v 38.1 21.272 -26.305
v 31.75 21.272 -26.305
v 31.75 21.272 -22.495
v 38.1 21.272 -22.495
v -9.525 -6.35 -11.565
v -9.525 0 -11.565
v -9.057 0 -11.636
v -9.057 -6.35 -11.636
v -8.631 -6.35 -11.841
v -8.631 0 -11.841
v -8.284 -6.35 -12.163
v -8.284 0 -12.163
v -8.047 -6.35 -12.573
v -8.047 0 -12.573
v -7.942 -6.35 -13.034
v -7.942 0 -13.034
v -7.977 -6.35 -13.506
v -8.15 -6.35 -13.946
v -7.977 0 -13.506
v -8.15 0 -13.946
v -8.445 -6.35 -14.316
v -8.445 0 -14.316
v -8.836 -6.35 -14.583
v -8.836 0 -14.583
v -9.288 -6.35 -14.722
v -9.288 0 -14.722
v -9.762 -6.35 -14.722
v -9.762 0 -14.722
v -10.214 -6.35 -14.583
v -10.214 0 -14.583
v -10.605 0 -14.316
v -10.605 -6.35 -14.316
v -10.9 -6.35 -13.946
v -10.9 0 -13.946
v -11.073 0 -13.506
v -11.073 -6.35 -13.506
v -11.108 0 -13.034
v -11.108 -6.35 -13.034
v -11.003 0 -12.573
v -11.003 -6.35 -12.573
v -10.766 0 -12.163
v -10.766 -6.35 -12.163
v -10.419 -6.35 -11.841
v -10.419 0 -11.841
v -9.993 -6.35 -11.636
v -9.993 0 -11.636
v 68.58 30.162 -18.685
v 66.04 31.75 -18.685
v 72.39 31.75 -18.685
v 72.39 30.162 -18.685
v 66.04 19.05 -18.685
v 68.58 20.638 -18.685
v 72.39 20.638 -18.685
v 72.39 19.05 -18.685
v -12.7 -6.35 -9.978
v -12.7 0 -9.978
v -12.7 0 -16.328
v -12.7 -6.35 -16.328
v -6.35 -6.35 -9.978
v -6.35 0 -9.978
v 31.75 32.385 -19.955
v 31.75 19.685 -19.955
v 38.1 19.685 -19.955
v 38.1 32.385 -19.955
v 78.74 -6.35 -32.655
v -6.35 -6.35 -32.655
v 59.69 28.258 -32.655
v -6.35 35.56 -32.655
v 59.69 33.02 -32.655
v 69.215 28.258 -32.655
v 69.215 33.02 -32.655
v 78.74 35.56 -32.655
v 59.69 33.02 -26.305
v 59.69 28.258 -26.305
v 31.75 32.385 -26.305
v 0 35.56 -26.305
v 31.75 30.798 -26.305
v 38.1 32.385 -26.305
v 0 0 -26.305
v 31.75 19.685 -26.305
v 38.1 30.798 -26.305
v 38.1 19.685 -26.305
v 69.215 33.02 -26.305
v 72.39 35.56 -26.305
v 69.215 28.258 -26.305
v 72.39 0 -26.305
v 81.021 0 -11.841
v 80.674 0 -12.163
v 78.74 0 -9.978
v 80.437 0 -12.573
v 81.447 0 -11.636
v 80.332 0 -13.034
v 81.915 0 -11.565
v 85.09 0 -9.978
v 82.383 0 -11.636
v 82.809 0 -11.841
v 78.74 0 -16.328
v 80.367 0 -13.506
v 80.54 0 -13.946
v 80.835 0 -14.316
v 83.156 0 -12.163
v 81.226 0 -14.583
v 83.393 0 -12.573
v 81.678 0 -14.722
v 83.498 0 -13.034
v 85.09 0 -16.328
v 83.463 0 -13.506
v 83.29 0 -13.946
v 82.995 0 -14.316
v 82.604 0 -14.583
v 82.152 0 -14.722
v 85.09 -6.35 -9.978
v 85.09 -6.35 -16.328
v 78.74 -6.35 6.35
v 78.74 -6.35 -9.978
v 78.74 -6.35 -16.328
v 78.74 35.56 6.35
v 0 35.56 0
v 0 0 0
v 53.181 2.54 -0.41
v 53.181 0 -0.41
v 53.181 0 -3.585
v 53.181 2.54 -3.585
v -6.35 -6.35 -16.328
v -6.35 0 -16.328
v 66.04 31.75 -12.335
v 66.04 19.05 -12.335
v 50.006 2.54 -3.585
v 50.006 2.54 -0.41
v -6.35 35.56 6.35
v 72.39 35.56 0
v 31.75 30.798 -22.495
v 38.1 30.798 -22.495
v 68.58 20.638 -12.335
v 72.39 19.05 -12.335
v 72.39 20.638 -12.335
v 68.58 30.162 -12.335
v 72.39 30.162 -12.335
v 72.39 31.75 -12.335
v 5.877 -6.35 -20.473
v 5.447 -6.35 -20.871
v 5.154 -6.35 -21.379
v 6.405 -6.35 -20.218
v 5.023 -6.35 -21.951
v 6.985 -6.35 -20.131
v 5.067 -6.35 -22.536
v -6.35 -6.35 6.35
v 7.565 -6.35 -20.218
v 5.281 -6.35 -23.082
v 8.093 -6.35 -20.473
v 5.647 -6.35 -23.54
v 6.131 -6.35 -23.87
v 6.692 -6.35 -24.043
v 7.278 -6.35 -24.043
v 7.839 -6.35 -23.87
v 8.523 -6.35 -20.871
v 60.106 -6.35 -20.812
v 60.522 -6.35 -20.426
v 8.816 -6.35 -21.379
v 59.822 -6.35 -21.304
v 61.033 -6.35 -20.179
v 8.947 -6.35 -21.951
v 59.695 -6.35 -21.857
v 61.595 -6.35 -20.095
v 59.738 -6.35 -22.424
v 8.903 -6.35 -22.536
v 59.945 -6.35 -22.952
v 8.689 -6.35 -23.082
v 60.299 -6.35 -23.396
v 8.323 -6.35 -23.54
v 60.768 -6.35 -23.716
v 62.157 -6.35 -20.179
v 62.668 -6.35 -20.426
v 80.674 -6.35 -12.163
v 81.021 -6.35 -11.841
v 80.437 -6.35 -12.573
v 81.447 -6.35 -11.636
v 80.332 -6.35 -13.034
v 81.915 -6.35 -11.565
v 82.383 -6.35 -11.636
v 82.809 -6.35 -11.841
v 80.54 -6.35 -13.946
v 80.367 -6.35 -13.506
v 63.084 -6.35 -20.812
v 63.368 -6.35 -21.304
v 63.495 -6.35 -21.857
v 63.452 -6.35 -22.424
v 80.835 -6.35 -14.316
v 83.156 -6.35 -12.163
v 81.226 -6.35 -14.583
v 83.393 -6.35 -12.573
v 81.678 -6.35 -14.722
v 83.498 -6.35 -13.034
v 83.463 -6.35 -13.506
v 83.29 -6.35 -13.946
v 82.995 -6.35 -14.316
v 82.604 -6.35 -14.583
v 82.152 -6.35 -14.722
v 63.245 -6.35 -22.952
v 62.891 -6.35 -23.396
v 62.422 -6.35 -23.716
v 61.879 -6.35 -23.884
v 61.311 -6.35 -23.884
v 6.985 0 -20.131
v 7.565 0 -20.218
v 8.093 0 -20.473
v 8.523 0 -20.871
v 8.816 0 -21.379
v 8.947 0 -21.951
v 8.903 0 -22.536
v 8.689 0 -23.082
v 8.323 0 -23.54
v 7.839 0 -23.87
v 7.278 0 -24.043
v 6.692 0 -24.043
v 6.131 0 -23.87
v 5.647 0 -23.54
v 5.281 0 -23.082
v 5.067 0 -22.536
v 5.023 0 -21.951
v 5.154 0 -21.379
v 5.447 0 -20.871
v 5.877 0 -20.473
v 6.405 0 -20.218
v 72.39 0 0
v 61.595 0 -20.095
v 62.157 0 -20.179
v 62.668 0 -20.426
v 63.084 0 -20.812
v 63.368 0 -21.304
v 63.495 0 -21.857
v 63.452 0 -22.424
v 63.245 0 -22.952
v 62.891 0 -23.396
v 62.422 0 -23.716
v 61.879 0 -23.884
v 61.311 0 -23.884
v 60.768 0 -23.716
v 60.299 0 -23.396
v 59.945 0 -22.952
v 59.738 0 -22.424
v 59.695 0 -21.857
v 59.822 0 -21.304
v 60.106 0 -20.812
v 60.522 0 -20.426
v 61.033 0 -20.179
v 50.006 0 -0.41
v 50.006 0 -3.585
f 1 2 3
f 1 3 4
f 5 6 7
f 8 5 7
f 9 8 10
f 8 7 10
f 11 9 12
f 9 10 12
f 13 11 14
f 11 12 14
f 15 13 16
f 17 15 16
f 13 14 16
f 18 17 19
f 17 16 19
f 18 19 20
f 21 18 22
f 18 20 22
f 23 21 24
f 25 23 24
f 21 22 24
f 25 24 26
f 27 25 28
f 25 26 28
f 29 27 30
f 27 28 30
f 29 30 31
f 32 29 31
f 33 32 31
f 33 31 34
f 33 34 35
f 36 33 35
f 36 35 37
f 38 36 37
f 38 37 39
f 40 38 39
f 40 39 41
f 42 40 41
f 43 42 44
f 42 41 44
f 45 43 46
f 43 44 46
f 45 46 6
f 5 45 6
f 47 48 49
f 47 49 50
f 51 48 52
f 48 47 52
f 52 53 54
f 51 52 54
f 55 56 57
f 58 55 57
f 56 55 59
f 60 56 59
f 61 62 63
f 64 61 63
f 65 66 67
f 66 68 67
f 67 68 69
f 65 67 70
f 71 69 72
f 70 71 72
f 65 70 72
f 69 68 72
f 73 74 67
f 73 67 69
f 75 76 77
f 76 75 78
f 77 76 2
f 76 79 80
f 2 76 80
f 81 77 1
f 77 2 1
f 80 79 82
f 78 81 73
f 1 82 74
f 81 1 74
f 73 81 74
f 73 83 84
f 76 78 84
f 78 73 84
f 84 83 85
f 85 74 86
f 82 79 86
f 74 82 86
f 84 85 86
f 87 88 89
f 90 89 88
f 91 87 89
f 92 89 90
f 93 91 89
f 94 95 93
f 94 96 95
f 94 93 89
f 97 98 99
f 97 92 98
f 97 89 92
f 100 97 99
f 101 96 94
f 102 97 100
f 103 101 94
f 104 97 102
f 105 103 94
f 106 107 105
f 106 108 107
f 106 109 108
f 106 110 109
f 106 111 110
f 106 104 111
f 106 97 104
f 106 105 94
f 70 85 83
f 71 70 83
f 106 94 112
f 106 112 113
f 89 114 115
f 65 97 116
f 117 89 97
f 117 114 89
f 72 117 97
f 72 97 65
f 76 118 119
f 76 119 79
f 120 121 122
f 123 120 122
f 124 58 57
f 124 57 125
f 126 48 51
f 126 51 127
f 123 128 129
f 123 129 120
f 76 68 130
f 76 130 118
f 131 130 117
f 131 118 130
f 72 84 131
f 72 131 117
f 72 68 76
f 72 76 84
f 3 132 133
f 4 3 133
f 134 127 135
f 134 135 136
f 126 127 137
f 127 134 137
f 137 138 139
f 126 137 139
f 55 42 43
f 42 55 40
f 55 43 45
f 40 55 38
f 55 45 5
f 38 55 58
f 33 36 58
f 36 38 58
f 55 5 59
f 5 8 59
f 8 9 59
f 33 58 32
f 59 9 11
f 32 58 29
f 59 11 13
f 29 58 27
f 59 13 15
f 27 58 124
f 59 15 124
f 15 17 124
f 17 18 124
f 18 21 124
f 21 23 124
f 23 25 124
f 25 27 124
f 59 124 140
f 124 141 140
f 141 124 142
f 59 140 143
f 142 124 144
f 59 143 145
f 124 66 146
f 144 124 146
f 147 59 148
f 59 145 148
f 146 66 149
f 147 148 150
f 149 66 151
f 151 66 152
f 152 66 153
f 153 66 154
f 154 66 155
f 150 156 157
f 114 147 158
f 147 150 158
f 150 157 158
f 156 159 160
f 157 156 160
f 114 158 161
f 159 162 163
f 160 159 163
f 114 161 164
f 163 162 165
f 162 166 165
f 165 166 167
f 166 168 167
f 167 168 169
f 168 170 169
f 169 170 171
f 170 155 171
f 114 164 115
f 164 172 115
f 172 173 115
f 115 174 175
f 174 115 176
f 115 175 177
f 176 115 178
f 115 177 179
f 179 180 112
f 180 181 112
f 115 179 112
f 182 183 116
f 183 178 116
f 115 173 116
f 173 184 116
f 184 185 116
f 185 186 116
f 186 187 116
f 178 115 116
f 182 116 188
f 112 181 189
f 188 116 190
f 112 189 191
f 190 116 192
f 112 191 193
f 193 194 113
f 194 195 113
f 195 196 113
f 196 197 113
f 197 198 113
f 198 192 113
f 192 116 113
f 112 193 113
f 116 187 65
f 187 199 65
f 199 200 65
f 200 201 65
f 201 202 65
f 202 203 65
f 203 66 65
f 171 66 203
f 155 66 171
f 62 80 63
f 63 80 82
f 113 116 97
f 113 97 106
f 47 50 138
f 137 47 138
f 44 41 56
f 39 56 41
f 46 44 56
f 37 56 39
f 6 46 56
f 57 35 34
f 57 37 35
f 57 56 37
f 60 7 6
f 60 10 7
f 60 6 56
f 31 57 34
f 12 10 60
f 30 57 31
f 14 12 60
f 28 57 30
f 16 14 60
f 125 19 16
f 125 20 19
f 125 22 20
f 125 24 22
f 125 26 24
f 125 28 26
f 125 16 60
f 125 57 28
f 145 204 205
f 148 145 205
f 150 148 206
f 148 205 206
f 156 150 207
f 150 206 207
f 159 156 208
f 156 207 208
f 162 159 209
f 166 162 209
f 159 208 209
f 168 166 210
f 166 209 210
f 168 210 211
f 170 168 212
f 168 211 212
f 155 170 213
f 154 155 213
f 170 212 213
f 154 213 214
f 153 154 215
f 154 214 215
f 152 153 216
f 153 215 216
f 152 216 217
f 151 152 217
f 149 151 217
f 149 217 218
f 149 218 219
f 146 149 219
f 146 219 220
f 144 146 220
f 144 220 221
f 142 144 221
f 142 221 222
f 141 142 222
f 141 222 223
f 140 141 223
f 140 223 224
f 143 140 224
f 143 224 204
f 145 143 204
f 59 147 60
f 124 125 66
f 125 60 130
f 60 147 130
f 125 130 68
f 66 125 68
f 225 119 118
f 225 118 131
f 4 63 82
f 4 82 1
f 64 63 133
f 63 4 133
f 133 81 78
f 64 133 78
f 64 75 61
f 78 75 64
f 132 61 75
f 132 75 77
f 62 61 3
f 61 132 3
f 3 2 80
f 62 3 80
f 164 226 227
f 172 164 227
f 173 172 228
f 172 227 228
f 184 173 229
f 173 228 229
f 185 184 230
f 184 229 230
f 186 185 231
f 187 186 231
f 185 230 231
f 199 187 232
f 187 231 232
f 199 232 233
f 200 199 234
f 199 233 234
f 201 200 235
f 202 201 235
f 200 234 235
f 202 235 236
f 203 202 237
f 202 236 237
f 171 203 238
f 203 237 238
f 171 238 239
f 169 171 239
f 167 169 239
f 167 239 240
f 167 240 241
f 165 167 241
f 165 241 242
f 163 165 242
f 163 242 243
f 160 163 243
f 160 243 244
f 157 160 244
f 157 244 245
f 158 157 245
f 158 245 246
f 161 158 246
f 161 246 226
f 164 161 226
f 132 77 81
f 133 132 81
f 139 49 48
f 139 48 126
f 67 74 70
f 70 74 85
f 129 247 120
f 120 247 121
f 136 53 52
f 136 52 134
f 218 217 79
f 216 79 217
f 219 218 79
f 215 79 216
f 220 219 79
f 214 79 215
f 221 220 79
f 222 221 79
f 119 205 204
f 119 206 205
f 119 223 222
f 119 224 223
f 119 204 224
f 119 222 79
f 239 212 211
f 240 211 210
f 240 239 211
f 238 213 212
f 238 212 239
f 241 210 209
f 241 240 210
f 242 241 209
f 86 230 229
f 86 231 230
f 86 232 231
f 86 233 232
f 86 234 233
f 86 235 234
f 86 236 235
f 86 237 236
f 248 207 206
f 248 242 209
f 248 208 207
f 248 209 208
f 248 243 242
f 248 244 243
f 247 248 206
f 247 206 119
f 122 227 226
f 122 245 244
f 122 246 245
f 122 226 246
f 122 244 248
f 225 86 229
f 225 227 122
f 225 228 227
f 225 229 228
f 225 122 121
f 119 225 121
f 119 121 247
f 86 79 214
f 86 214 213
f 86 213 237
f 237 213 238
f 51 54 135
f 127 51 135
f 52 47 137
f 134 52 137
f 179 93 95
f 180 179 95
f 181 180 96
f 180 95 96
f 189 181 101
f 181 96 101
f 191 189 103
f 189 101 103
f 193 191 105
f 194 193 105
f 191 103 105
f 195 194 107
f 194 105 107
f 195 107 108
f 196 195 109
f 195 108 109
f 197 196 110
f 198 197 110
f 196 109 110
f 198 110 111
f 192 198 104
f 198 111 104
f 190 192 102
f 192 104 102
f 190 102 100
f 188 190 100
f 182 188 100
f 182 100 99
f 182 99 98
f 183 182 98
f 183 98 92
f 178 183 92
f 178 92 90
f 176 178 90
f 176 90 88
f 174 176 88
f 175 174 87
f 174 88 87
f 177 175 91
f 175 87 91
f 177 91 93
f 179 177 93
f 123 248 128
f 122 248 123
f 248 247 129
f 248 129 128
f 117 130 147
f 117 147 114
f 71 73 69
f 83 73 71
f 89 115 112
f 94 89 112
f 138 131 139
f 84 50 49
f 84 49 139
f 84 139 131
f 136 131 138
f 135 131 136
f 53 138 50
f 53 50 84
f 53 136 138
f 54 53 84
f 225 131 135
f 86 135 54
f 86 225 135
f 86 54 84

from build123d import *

# Parameters (mm, degrees)
SKETCH1_W                 = 72.39
SKETCH1_H                 = 26.30542054
BOSS_EXTRUDE1_DEPTH       = 35.56
SKETCH1_3_W               = 85.09
SKETCH1_3_H               = 39.00542054
SKETCH1_3_R               = 1.967283446
SKETCH1_3_W_2             = 3.175
SKETCH1_3_H_2             = 3.175
SKETCH1_3_R_2             = 1.397
BOSS_EXTRUDE2_DEPTH       = 6.35
SKETCH1_4_W               = 6.35
SKETCH1_4_H               = 6.35
SKETCH1_4_R               = 1.5875
BOSS_EXTRUDE3_DEPTH       = 6.35
SKETCH1_5_R               = 1.967283446
BOSS_EXTRUDE4_DEPTH       = 2.54
SKETCH2_W                 = 6.35
SKETCH2_H                 = 12.7
BOSS_EXTRUDE8_DEPTH       = 6.35
SKETCH2_4_W               = 6.35
SKETCH2_4_H               = 9.525
CUT_EXTRUDE1_DEPTH        = 3.81
SKETCH1_10_R              = 1.905
SKETCH1_10_R_2            = 1.397
SKETCH1_10_R_3            = 1.967283446
CUT_EXTRUDE4_DEPTH        = 98.832500687
BOSS_EXTRUDE11_DEPTH      = 2.54
BOSS_EXTRUDE11_DEPTH_BACK = 6.35
SKETCH1_11_W              = 3.175
SKETCH1_11_H              = 3.175
SKETCH6_W                 = 6.35
SKETCH6_H                 = 12.7
BOSS_EXTRUDE12_DEPTH      = 6.35
SKETCH6_8_W               = 6.35
SKETCH6_8_H               = 9.525
CUT_EXTRUDE5_DEPTH        = 3.81
SKETCH8_W                 = 9.525
SKETCH8_H                 = 4.7625
CUT_EXTRUDE6_DEPTH        = 18.542


with BuildPart() as part:
    # Sketch1 → Boss-Extrude1 (new body)
    with BuildSketch(Plane(origin=(0, 0, 0), x_dir=(1, 0, 0), z_dir=(0, 1, 0))):
        Polygon((78.74, 32.65542054), (-6.35, 32.65542054), (-6.35, 16.32771027), (-6.35, 9.97771027), (-6.35, -6.35), (78.74, -6.35), (78.74, 9.97771027), (78.74, 16.32771027), align=None)
        with Locations((36.195, 13.15271027)):
            Rectangle(SKETCH1_W, SKETCH1_H, mode=Mode.SUBTRACT)
    extrude(amount=BOSS_EXTRUDE1_DEPTH)

    # Sketch1<3> → Boss-Extrude2 (add)
    with BuildSketch(Plane(origin=(0, 0, 0), x_dir=(1, 0, 0), z_dir=(0, 1, 0))):
        with Locations((36.195, 13.15271027)):
            Rectangle(SKETCH1_3_W, SKETCH1_3_H)
        with Locations((6.985, 22.098)):
            Circle(SKETCH1_3_R, mode=Mode.SUBTRACT)
        with Locations((51.59375, 1.997278049)):
            Rectangle(SKETCH1_3_W_2, SKETCH1_3_H_2, mode=Mode.SUBTRACT)
        with Locations((61.595, 21.999778049)):
            Circle(SKETCH1_3_R_2, mode=Mode.SUBTRACT)
    extrude(amount=-BOSS_EXTRUDE2_DEPTH)

    # Sketch1<4> → Boss-Extrude3 (add)
    # profile 1 of 2: a face of its own
    with BuildSketch(Plane(origin=(0, 0, 0), x_dir=(1, 0, 0), z_dir=(0, 1, 0))):
        with Locations((-9.525, 13.15271027)):
            Rectangle(SKETCH1_4_W, SKETCH1_4_H)
        with Locations((-9.525, 13.15271027)):
            Circle(SKETCH1_4_R, mode=Mode.SUBTRACT)
    # profile 2 of 2: a face of its own
    with BuildSketch(Plane(origin=(0, 0, 0), x_dir=(1, 0, 0), z_dir=(0, 1, 0))):
        with Locations((81.915, 13.15271027)):
            Rectangle(SKETCH1_4_W, SKETCH1_4_H)
        with Locations((81.915, 13.15271027)):
            Circle(SKETCH1_4_R, mode=Mode.SUBTRACT)
    extrude(amount=-BOSS_EXTRUDE3_DEPTH)

    # Sketch1<5> → Boss-Extrude4 (add)
    with BuildSketch(Plane(origin=(0, 0, 0), x_dir=(1, 0, 0), z_dir=(0, 1, 0))):
        with Locations((6.985, 22.098)):
            Circle(SKETCH1_5_R)
    extrude(amount=-BOSS_EXTRUDE4_DEPTH)

    # Sketch2 → Boss-Extrude8 (add)
    with BuildSketch(Plane.XY.offset(-26.30542054)):
        with Locations((34.925, 26.035)):
            Rectangle(SKETCH2_W, SKETCH2_H)
    extrude(amount=BOSS_EXTRUDE8_DEPTH)

    # Sketch2<4> → Cut-Extrude1 (cut)
    with BuildSketch(Plane.XY.offset(-26.30542054)):
        with Locations((34.925, 26.035)):
            Rectangle(SKETCH2_4_W, SKETCH2_4_H)
    extrude(amount=CUT_EXTRUDE1_DEPTH, mode=Mode.SUBTRACT)

    # Sketch1<10> → Cut-Extrude4 (cut, through all)
    # profile 1 of 2: a face of its own
    with BuildSketch(Plane(origin=(0, 0, 0), x_dir=(1, 0, 0), z_dir=(0, 1, 0))):
        with Locations((61.595, 21.999778049)):
            Circle(SKETCH1_10_R)
        with Locations((61.595, 21.999778049)):
            Circle(SKETCH1_10_R_2, mode=Mode.SUBTRACT)
    # profile 2 of 2: a face of its own
    with BuildSketch(Plane(origin=(0, 0, 0), x_dir=(1, 0, 0), z_dir=(0, 1, 0))):
        with Locations((6.985, 22.098)):
            Circle(SKETCH1_10_R_3)
        with Locations((6.985, 22.098)):
            Circle(SKETCH1_10_R_2, mode=Mode.SUBTRACT)
    extrude(amount=-CUT_EXTRUDE4_DEPTH, mode=Mode.SUBTRACT)


with BuildPart() as cut_extrude4_piece_1:
    # of the separate pieces the step leaves, piece 1, a body of its own (cut_extrude4_pieces)
    add(part.part.solids().sort_by_distance((78.74, 35.56, -32.65542054))[0])

    # Sketch1<11> → Boss-Extrude11 (add, two sides: drawn at the far end of the back side and taken through both)
    with BuildSketch(Plane(origin=(0, 0, 0), x_dir=(1, 0, 0), z_dir=(0, 1, 0)).offset(-BOSS_EXTRUDE11_DEPTH_BACK)):
        with Locations((51.59375, 1.997278049)):
            Rectangle(SKETCH1_11_W, SKETCH1_11_H)
    extrude(amount=BOSS_EXTRUDE11_DEPTH + BOSS_EXTRUDE11_DEPTH_BACK)

    # Sketch6 → Boss-Extrude12 (add)
    with BuildSketch(Plane(origin=(72.39, 0, -72.39), x_dir=(0, 0, 1), z_dir=(-1, 0, 0))):
        with Locations((56.87957946, 25.4)):
            Rectangle(SKETCH6_W, SKETCH6_H)
    extrude(amount=BOSS_EXTRUDE12_DEPTH)

    # Sketch6<8> → Cut-Extrude5 (cut)
    with BuildSketch(Plane(origin=(72.39, 0, -72.39), x_dir=(0, 0, 1), z_dir=(-1, 0, 0))):
        with Locations((56.87957946, 25.4)):
            Rectangle(SKETCH6_8_W, SKETCH6_8_H)
    extrude(amount=CUT_EXTRUDE5_DEPTH, mode=Mode.SUBTRACT)

    # Sketch8 → Cut-Extrude6 (cut)
    with BuildSketch(Plane.XY.offset(-26.30542054)):
        with Locations((64.4525, 30.63875)):
            Rectangle(SKETCH8_W, SKETCH8_H)
    extrude(amount=-CUT_EXTRUDE6_DEPTH, mode=Mode.SUBTRACT)


with BuildPart() as cut_extrude4_piece_2:
    # of the separate pieces the step leaves, piece 2, a body of its own (cut_extrude4_pieces)
    add(part.part.solids().sort_by_distance((8.382, -2.54, -22.098))[0])


solid = cut_extrude4_piece_1.part
